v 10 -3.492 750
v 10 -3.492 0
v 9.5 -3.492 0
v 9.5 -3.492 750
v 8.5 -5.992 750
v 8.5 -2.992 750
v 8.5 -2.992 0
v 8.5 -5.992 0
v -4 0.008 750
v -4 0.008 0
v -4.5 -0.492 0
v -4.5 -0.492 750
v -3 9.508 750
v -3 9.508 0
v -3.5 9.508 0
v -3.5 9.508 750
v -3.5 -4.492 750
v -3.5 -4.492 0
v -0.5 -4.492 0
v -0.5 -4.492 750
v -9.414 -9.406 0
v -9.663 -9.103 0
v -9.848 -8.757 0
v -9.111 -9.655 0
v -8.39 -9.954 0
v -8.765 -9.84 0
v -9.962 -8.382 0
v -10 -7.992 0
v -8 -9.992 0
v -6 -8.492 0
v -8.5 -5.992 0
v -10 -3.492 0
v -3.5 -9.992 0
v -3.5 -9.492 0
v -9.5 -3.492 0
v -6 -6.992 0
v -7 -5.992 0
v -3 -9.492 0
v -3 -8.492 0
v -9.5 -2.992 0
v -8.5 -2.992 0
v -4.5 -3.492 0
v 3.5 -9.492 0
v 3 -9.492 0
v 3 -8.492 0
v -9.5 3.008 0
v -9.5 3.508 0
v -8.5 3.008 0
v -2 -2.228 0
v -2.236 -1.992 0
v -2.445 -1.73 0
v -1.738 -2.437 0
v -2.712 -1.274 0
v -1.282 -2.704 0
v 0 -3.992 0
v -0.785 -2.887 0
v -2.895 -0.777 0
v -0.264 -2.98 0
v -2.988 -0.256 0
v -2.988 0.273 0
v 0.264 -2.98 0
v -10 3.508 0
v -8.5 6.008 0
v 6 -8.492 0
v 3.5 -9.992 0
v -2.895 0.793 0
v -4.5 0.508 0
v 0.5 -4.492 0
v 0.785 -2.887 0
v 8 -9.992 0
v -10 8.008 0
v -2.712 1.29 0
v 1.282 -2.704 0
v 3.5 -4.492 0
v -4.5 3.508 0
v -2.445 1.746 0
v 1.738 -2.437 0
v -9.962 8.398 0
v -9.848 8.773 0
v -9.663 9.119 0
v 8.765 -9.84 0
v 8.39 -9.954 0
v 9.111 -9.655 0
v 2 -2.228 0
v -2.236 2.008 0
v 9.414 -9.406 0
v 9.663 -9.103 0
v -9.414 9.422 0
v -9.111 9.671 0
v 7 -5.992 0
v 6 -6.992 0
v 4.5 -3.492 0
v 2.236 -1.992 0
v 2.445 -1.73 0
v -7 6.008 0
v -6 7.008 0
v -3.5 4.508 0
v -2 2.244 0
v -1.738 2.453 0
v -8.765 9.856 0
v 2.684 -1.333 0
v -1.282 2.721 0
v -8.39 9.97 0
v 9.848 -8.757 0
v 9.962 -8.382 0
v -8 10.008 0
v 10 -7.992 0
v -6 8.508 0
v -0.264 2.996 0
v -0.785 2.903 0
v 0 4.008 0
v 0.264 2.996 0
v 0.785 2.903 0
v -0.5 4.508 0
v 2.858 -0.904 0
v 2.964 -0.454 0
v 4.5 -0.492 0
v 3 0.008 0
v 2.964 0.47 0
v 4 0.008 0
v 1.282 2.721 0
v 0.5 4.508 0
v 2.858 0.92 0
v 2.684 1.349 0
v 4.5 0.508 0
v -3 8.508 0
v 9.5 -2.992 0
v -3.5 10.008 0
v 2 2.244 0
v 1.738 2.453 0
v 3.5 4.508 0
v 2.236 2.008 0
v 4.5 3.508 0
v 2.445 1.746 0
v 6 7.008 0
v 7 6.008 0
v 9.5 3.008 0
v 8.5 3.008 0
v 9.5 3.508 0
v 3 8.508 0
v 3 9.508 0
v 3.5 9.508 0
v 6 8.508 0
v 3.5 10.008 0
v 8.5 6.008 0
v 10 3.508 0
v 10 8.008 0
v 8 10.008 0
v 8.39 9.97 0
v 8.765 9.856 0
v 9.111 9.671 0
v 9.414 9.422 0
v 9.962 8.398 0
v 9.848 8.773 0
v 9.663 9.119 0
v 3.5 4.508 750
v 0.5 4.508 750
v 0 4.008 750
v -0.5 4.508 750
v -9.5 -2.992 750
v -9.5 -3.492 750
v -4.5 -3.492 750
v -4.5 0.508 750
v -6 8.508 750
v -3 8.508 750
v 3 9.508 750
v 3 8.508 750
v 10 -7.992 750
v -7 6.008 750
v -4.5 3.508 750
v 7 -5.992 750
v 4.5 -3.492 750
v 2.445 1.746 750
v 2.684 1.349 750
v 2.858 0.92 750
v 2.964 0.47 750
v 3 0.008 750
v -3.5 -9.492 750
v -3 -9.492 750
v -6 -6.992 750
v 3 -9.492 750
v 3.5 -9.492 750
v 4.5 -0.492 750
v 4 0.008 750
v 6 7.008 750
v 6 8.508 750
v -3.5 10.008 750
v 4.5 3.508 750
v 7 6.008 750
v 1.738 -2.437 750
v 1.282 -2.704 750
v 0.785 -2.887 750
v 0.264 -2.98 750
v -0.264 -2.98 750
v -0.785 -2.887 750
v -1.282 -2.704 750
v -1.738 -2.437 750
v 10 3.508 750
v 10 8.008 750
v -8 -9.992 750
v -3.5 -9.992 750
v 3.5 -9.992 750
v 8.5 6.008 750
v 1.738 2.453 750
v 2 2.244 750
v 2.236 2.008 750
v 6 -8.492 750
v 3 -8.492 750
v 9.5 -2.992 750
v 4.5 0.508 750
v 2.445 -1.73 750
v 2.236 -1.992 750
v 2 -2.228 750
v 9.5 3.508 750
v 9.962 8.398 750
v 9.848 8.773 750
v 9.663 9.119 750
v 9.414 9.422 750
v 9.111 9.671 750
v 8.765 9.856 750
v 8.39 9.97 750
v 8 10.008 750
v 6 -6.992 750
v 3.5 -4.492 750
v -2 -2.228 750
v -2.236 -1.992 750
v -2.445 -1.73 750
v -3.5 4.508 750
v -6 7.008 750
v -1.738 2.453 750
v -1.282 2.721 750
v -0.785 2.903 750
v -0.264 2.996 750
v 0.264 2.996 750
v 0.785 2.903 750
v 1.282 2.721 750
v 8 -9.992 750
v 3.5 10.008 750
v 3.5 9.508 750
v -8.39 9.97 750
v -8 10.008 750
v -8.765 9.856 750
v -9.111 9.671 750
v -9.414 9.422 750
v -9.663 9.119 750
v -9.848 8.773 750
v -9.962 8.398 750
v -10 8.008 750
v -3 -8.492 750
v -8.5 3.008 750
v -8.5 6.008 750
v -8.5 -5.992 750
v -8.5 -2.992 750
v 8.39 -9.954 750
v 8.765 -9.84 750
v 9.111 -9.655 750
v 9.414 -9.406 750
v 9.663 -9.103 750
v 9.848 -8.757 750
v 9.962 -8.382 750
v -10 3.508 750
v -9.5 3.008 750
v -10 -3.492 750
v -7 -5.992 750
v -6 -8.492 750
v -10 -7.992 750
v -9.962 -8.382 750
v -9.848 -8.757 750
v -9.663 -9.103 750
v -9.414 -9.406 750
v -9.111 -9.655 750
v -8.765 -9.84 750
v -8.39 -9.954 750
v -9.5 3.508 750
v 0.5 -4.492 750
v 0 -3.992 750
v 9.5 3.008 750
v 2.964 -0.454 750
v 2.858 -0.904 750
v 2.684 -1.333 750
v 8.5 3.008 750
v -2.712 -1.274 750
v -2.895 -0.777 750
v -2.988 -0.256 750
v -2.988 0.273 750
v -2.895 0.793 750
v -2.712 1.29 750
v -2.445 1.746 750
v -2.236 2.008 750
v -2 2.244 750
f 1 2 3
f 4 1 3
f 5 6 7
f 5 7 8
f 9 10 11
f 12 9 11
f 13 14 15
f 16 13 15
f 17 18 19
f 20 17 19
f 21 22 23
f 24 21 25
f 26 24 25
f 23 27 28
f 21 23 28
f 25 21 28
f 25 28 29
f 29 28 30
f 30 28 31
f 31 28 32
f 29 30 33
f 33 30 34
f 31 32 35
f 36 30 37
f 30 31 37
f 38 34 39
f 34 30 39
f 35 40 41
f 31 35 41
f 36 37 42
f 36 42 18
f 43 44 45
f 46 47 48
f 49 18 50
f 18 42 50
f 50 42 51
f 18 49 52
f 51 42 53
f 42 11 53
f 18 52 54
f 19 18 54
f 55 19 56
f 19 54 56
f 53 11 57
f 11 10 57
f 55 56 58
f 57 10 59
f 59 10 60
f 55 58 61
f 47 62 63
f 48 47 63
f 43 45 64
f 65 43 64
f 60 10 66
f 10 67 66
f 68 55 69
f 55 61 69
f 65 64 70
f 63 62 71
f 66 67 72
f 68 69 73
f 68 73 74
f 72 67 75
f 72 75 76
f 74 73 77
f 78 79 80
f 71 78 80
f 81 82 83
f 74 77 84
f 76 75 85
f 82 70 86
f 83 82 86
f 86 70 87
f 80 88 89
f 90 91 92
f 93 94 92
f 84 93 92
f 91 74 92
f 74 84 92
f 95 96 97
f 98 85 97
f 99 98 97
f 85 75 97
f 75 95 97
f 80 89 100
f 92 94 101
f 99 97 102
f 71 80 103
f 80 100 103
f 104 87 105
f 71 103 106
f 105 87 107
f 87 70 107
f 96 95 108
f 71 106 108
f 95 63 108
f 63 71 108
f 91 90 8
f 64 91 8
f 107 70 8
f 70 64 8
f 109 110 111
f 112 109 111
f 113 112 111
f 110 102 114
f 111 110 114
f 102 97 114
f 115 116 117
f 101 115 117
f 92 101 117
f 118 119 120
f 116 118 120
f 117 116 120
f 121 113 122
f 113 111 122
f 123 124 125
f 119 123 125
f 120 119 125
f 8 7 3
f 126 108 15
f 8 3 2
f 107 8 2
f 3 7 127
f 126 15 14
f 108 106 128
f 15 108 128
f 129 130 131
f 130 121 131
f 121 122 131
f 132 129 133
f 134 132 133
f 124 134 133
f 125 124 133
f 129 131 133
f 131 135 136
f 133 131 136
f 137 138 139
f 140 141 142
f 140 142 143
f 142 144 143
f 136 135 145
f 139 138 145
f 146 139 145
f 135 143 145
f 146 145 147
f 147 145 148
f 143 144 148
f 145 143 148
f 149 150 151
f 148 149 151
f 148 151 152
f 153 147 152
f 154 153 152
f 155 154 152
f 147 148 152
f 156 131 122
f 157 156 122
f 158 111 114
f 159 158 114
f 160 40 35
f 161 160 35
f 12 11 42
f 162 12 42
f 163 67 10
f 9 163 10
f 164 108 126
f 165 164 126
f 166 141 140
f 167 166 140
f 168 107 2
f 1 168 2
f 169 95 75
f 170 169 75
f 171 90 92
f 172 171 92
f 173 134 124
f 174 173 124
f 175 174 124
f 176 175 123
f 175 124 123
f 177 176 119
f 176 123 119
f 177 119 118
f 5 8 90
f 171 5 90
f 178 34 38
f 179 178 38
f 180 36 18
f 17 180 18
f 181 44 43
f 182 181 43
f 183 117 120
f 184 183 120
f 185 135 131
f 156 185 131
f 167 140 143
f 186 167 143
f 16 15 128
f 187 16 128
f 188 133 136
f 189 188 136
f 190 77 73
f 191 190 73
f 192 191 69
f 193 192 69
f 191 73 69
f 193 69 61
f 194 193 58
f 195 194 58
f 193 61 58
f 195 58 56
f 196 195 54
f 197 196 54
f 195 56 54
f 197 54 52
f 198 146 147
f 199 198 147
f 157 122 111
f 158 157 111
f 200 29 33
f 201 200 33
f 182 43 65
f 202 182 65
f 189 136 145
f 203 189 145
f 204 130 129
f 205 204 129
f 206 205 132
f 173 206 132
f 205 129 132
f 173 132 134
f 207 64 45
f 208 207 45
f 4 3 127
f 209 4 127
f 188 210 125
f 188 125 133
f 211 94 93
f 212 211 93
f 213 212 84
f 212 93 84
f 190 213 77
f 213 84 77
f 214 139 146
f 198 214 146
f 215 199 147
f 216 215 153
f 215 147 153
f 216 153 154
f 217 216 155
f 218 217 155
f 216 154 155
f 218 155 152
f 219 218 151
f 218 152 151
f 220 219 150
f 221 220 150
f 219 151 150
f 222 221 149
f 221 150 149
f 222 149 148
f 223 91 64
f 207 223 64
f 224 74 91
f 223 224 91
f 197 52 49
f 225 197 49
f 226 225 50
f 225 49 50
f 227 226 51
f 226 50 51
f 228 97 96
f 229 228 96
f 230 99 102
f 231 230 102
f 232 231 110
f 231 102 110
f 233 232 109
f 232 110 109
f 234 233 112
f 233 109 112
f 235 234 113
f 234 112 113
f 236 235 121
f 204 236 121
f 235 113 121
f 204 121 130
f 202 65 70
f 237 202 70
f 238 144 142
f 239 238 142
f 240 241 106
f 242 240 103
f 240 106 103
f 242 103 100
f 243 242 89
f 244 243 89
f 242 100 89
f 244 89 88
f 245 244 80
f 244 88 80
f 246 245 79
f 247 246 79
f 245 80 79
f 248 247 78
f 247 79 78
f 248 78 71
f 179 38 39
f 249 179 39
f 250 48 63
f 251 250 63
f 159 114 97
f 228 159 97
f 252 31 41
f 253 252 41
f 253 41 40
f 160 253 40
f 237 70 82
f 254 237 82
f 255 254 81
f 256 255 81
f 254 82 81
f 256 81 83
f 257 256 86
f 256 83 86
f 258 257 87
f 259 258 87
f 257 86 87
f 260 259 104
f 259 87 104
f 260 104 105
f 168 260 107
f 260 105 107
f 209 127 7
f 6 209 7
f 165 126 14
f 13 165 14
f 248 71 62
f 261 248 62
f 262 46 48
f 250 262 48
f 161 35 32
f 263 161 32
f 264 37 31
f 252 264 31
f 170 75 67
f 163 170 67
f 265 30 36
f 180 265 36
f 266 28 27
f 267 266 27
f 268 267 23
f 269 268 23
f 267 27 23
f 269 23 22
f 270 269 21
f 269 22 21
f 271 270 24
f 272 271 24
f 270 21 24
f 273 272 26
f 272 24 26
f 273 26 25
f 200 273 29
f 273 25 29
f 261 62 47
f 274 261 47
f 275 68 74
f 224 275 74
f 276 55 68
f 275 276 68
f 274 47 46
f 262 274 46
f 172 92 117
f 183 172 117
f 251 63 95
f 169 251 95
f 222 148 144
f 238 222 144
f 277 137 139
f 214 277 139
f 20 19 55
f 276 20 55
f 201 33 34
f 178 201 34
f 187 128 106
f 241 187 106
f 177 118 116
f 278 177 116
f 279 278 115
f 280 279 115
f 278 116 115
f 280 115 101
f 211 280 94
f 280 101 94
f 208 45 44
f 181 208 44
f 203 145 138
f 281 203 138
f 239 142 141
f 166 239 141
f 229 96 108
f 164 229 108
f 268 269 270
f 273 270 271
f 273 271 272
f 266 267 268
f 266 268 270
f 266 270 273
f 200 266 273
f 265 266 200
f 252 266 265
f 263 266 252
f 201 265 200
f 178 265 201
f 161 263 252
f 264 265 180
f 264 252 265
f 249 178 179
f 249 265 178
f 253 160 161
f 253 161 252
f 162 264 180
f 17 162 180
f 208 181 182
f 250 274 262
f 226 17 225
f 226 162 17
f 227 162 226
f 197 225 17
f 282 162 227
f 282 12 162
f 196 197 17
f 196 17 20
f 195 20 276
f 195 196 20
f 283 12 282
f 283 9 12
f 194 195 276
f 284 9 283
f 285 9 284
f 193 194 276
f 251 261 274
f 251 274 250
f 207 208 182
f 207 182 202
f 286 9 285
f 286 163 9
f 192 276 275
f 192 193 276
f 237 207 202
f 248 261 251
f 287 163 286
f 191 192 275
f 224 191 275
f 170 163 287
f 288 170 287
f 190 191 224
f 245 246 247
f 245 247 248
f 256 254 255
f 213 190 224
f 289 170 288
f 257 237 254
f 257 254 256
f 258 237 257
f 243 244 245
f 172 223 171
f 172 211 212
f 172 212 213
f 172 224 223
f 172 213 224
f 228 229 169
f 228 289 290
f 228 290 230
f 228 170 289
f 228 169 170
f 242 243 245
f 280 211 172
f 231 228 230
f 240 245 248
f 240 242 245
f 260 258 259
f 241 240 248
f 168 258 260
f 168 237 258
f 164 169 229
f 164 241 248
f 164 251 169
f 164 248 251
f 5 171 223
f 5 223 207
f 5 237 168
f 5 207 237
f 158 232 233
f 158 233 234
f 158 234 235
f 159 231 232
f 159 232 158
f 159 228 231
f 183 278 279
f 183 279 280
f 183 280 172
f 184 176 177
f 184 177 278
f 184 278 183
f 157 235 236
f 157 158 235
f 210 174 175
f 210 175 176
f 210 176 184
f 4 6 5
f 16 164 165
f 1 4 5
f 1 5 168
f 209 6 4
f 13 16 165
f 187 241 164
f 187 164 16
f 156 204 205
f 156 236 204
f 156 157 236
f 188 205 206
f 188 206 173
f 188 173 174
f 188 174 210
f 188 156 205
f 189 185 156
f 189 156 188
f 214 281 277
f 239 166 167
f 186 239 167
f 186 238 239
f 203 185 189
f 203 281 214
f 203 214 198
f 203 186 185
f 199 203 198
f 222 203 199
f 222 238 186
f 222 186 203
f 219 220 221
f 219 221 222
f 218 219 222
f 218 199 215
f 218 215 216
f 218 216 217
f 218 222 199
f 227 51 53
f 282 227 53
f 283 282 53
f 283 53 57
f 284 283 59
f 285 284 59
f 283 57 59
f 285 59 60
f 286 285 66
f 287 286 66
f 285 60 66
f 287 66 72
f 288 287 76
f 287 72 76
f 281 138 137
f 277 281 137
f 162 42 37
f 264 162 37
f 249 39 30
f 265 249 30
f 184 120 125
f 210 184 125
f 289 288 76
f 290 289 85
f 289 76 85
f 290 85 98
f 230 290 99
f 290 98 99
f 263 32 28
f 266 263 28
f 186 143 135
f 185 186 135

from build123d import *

# Parameters (mm, degrees)
F1_DEPTH = 750


with BuildPart() as f1:
    # F0 (on Top) → F1 (new body)
    with BuildSketch(Plane.XY):
        with BuildLine():
            ThreePointArc((-10, -7.991953), (-9.414214, -9.406167), (-8, -9.991953))
            Line((-8, -9.991953), (-3.5, -9.991953))
            Line((-3.5, -9.991953), (-3.5, -9.491953))
            Line((-3.5, -9.491953), (-3, -9.491953))
            Line((-3, -9.491953), (-3, -8.491953))
            Line((-3, -8.491953), (-6, -8.491953))
            Line((-6, -8.491953), (-6, -6.991953))
            Line((-6, -6.991953), (-3.5, -4.491953))
            Line((-3.5, -4.491953), (-0.5, -4.491953))
            Line((-0.5, -4.491953), (0, -3.991953))
            Line((0, -3.991953), (0.5, -4.491953))
            Line((0.5, -4.491953), (3.5, -4.491953))
            Line((3.5, -4.491953), (6, -6.991953))
            Line((6, -6.991953), (6, -8.491953))
            Line((6, -8.491953), (3, -8.491953))
            Line((3, -8.491953), (3, -9.491953))
            Line((3, -9.491953), (3.5, -9.491953))
            Line((3.5, -9.491953), (3.5, -9.991953))
            Line((3.5, -9.991953), (8, -9.991953))
            ThreePointArc((8, -9.991953), (9.414214, -9.406167), (10, -7.991953))
            Line((10, -7.991953), (10, -3.491953))
            Line((10, -3.491953), (9.5, -3.491953))
            Line((9.5, -3.491953), (9.5, -2.991953))
            Line((9.5, -2.991953), (8.5, -2.991953))
            Line((8.5, -2.991953), (8.5, -5.991953))
            Line((8.5, -5.991953), (7, -5.991953))
            Line((7, -5.991953), (4.5, -3.491953))
            Line((4.5, -3.491953), (4.5, -0.491953))
            Line((4.5, -0.491953), (4, 0.008047))
            Line((4, 0.008047), (4.5, 0.508047))
            Line((4.5, 0.508047), (4.5, 3.508047))
            Line((4.5, 3.508047), (7, 6.008047))
            Line((7, 6.008047), (8.5, 6.008047))
            Line((8.5, 6.008047), (8.5, 3.008047))
            Line((8.5, 3.008047), (9.5, 3.008047))
            Line((9.5, 3.008047), (9.5, 3.508047))
            Line((9.5, 3.508047), (10, 3.508047))
            Line((10, 3.508047), (10, 8.008047))
            ThreePointArc((10, 8.008047), (9.414214, 9.422261), (8, 10.008047))
            Line((8, 10.008047), (3.5, 10.008047))
            Line((3.5, 10.008047), (3.5, 9.508047))
            Line((3.5, 9.508047), (3, 9.508047))
            Line((3, 9.508047), (3, 8.508047))
            Line((3, 8.508047), (6, 8.508047))
            Line((6, 8.508047), (6, 7.008047))
            Line((6, 7.008047), (3.5, 4.508047))
            Line((3.5, 4.508047), (0.5, 4.508047))
            Line((0.5, 4.508047), (0, 4.008047))
            Line((0, 4.008047), (-0.5, 4.508047))
            Line((-0.5, 4.508047), (-3.5, 4.508047))
            Line((-3.5, 4.508047), (-6, 7.008047))
            Line((-6, 7.008047), (-6, 8.508047))
            Line((-6, 8.508047), (-3, 8.508047))
            Line((-3, 8.508047), (-3, 9.508047))
            Line((-3, 9.508047), (-3.5, 9.508047))
            Line((-3.5, 9.508047), (-3.5, 10.008047))
            Line((-3.5, 10.008047), (-8, 10.008047))
            ThreePointArc((-8, 10.008047), (-9.414214, 9.422261), (-10, 8.008047))
            Line((-10, 8.008047), (-10, 3.508047))
            Line((-10, 3.508047), (-9.5, 3.508047))
            Line((-9.5, 3.508047), (-9.5, 3.008047))
            Line((-9.5, 3.008047), (-8.5, 3.008047))
            Line((-8.5, 3.008047), (-8.5, 6.008047))
            Line((-8.5, 6.008047), (-7, 6.008047))
            Line((-7, 6.008047), (-4.5, 3.508047))
            Line((-4.5, 3.508047), (-4.5, 0.508047))
            Line((-4.5, 0.508047), (-4, 0.008047))
            Line((-4, 0.008047), (-4.5, -0.491953))
            Line((-4.5, -0.491953), (-4.5, -3.491953))
            Line((-4.5, -3.491953), (-7, -5.991953))
            Line((-7, -5.991953), (-8.5, -5.991953))
            Line((-8.5, -5.991953), (-8.5, -2.991953))
            Line((-8.5, -2.991953), (-9.5, -2.991953))
            Line((-9.5, -2.991953), (-9.5, -3.491953))
            Line((-9.5, -3.491953), (-10, -3.491953))
            Line((-10, -3.491953), (-10, -7.991953))
        make_face()
        with BuildLine():
            ThreePointArc((2.445203, 1.746144), (2.857937, 0.920294), (3, 0.008047))
            ThreePointArc((3, 0.008047), (2.857937, -0.9042), (2.445203, -1.73005))
            ThreePointArc((2.445203, -1.73005), (2.12132, -2.113273), (1.738097, -2.437156))
            ThreePointArc((1.738097, -2.437156), (0, -2.991953), (-1.738097, -2.437156))
            ThreePointArc((-1.738097, -2.437156), (-2.12132, -2.113273), (-2.445203, -1.73005))
            ThreePointArc((-2.445203, -1.73005), (-3, 0.008047), (-2.445203, 1.746144))
            ThreePointArc((-2.445203, 1.746144), (-2.12132, 2.129367), (-1.738097, 2.45325))
            ThreePointArc((-1.738097, 2.45325), (0, 3.008047), (1.738097, 2.45325))
            ThreePointArc((1.738097, 2.45325), (2.12132, 2.129367), (2.445203, 1.746144))
        make_face(mode=Mode.SUBTRACT)
    extrude(amount=F1_DEPTH)


solid = f1.part
